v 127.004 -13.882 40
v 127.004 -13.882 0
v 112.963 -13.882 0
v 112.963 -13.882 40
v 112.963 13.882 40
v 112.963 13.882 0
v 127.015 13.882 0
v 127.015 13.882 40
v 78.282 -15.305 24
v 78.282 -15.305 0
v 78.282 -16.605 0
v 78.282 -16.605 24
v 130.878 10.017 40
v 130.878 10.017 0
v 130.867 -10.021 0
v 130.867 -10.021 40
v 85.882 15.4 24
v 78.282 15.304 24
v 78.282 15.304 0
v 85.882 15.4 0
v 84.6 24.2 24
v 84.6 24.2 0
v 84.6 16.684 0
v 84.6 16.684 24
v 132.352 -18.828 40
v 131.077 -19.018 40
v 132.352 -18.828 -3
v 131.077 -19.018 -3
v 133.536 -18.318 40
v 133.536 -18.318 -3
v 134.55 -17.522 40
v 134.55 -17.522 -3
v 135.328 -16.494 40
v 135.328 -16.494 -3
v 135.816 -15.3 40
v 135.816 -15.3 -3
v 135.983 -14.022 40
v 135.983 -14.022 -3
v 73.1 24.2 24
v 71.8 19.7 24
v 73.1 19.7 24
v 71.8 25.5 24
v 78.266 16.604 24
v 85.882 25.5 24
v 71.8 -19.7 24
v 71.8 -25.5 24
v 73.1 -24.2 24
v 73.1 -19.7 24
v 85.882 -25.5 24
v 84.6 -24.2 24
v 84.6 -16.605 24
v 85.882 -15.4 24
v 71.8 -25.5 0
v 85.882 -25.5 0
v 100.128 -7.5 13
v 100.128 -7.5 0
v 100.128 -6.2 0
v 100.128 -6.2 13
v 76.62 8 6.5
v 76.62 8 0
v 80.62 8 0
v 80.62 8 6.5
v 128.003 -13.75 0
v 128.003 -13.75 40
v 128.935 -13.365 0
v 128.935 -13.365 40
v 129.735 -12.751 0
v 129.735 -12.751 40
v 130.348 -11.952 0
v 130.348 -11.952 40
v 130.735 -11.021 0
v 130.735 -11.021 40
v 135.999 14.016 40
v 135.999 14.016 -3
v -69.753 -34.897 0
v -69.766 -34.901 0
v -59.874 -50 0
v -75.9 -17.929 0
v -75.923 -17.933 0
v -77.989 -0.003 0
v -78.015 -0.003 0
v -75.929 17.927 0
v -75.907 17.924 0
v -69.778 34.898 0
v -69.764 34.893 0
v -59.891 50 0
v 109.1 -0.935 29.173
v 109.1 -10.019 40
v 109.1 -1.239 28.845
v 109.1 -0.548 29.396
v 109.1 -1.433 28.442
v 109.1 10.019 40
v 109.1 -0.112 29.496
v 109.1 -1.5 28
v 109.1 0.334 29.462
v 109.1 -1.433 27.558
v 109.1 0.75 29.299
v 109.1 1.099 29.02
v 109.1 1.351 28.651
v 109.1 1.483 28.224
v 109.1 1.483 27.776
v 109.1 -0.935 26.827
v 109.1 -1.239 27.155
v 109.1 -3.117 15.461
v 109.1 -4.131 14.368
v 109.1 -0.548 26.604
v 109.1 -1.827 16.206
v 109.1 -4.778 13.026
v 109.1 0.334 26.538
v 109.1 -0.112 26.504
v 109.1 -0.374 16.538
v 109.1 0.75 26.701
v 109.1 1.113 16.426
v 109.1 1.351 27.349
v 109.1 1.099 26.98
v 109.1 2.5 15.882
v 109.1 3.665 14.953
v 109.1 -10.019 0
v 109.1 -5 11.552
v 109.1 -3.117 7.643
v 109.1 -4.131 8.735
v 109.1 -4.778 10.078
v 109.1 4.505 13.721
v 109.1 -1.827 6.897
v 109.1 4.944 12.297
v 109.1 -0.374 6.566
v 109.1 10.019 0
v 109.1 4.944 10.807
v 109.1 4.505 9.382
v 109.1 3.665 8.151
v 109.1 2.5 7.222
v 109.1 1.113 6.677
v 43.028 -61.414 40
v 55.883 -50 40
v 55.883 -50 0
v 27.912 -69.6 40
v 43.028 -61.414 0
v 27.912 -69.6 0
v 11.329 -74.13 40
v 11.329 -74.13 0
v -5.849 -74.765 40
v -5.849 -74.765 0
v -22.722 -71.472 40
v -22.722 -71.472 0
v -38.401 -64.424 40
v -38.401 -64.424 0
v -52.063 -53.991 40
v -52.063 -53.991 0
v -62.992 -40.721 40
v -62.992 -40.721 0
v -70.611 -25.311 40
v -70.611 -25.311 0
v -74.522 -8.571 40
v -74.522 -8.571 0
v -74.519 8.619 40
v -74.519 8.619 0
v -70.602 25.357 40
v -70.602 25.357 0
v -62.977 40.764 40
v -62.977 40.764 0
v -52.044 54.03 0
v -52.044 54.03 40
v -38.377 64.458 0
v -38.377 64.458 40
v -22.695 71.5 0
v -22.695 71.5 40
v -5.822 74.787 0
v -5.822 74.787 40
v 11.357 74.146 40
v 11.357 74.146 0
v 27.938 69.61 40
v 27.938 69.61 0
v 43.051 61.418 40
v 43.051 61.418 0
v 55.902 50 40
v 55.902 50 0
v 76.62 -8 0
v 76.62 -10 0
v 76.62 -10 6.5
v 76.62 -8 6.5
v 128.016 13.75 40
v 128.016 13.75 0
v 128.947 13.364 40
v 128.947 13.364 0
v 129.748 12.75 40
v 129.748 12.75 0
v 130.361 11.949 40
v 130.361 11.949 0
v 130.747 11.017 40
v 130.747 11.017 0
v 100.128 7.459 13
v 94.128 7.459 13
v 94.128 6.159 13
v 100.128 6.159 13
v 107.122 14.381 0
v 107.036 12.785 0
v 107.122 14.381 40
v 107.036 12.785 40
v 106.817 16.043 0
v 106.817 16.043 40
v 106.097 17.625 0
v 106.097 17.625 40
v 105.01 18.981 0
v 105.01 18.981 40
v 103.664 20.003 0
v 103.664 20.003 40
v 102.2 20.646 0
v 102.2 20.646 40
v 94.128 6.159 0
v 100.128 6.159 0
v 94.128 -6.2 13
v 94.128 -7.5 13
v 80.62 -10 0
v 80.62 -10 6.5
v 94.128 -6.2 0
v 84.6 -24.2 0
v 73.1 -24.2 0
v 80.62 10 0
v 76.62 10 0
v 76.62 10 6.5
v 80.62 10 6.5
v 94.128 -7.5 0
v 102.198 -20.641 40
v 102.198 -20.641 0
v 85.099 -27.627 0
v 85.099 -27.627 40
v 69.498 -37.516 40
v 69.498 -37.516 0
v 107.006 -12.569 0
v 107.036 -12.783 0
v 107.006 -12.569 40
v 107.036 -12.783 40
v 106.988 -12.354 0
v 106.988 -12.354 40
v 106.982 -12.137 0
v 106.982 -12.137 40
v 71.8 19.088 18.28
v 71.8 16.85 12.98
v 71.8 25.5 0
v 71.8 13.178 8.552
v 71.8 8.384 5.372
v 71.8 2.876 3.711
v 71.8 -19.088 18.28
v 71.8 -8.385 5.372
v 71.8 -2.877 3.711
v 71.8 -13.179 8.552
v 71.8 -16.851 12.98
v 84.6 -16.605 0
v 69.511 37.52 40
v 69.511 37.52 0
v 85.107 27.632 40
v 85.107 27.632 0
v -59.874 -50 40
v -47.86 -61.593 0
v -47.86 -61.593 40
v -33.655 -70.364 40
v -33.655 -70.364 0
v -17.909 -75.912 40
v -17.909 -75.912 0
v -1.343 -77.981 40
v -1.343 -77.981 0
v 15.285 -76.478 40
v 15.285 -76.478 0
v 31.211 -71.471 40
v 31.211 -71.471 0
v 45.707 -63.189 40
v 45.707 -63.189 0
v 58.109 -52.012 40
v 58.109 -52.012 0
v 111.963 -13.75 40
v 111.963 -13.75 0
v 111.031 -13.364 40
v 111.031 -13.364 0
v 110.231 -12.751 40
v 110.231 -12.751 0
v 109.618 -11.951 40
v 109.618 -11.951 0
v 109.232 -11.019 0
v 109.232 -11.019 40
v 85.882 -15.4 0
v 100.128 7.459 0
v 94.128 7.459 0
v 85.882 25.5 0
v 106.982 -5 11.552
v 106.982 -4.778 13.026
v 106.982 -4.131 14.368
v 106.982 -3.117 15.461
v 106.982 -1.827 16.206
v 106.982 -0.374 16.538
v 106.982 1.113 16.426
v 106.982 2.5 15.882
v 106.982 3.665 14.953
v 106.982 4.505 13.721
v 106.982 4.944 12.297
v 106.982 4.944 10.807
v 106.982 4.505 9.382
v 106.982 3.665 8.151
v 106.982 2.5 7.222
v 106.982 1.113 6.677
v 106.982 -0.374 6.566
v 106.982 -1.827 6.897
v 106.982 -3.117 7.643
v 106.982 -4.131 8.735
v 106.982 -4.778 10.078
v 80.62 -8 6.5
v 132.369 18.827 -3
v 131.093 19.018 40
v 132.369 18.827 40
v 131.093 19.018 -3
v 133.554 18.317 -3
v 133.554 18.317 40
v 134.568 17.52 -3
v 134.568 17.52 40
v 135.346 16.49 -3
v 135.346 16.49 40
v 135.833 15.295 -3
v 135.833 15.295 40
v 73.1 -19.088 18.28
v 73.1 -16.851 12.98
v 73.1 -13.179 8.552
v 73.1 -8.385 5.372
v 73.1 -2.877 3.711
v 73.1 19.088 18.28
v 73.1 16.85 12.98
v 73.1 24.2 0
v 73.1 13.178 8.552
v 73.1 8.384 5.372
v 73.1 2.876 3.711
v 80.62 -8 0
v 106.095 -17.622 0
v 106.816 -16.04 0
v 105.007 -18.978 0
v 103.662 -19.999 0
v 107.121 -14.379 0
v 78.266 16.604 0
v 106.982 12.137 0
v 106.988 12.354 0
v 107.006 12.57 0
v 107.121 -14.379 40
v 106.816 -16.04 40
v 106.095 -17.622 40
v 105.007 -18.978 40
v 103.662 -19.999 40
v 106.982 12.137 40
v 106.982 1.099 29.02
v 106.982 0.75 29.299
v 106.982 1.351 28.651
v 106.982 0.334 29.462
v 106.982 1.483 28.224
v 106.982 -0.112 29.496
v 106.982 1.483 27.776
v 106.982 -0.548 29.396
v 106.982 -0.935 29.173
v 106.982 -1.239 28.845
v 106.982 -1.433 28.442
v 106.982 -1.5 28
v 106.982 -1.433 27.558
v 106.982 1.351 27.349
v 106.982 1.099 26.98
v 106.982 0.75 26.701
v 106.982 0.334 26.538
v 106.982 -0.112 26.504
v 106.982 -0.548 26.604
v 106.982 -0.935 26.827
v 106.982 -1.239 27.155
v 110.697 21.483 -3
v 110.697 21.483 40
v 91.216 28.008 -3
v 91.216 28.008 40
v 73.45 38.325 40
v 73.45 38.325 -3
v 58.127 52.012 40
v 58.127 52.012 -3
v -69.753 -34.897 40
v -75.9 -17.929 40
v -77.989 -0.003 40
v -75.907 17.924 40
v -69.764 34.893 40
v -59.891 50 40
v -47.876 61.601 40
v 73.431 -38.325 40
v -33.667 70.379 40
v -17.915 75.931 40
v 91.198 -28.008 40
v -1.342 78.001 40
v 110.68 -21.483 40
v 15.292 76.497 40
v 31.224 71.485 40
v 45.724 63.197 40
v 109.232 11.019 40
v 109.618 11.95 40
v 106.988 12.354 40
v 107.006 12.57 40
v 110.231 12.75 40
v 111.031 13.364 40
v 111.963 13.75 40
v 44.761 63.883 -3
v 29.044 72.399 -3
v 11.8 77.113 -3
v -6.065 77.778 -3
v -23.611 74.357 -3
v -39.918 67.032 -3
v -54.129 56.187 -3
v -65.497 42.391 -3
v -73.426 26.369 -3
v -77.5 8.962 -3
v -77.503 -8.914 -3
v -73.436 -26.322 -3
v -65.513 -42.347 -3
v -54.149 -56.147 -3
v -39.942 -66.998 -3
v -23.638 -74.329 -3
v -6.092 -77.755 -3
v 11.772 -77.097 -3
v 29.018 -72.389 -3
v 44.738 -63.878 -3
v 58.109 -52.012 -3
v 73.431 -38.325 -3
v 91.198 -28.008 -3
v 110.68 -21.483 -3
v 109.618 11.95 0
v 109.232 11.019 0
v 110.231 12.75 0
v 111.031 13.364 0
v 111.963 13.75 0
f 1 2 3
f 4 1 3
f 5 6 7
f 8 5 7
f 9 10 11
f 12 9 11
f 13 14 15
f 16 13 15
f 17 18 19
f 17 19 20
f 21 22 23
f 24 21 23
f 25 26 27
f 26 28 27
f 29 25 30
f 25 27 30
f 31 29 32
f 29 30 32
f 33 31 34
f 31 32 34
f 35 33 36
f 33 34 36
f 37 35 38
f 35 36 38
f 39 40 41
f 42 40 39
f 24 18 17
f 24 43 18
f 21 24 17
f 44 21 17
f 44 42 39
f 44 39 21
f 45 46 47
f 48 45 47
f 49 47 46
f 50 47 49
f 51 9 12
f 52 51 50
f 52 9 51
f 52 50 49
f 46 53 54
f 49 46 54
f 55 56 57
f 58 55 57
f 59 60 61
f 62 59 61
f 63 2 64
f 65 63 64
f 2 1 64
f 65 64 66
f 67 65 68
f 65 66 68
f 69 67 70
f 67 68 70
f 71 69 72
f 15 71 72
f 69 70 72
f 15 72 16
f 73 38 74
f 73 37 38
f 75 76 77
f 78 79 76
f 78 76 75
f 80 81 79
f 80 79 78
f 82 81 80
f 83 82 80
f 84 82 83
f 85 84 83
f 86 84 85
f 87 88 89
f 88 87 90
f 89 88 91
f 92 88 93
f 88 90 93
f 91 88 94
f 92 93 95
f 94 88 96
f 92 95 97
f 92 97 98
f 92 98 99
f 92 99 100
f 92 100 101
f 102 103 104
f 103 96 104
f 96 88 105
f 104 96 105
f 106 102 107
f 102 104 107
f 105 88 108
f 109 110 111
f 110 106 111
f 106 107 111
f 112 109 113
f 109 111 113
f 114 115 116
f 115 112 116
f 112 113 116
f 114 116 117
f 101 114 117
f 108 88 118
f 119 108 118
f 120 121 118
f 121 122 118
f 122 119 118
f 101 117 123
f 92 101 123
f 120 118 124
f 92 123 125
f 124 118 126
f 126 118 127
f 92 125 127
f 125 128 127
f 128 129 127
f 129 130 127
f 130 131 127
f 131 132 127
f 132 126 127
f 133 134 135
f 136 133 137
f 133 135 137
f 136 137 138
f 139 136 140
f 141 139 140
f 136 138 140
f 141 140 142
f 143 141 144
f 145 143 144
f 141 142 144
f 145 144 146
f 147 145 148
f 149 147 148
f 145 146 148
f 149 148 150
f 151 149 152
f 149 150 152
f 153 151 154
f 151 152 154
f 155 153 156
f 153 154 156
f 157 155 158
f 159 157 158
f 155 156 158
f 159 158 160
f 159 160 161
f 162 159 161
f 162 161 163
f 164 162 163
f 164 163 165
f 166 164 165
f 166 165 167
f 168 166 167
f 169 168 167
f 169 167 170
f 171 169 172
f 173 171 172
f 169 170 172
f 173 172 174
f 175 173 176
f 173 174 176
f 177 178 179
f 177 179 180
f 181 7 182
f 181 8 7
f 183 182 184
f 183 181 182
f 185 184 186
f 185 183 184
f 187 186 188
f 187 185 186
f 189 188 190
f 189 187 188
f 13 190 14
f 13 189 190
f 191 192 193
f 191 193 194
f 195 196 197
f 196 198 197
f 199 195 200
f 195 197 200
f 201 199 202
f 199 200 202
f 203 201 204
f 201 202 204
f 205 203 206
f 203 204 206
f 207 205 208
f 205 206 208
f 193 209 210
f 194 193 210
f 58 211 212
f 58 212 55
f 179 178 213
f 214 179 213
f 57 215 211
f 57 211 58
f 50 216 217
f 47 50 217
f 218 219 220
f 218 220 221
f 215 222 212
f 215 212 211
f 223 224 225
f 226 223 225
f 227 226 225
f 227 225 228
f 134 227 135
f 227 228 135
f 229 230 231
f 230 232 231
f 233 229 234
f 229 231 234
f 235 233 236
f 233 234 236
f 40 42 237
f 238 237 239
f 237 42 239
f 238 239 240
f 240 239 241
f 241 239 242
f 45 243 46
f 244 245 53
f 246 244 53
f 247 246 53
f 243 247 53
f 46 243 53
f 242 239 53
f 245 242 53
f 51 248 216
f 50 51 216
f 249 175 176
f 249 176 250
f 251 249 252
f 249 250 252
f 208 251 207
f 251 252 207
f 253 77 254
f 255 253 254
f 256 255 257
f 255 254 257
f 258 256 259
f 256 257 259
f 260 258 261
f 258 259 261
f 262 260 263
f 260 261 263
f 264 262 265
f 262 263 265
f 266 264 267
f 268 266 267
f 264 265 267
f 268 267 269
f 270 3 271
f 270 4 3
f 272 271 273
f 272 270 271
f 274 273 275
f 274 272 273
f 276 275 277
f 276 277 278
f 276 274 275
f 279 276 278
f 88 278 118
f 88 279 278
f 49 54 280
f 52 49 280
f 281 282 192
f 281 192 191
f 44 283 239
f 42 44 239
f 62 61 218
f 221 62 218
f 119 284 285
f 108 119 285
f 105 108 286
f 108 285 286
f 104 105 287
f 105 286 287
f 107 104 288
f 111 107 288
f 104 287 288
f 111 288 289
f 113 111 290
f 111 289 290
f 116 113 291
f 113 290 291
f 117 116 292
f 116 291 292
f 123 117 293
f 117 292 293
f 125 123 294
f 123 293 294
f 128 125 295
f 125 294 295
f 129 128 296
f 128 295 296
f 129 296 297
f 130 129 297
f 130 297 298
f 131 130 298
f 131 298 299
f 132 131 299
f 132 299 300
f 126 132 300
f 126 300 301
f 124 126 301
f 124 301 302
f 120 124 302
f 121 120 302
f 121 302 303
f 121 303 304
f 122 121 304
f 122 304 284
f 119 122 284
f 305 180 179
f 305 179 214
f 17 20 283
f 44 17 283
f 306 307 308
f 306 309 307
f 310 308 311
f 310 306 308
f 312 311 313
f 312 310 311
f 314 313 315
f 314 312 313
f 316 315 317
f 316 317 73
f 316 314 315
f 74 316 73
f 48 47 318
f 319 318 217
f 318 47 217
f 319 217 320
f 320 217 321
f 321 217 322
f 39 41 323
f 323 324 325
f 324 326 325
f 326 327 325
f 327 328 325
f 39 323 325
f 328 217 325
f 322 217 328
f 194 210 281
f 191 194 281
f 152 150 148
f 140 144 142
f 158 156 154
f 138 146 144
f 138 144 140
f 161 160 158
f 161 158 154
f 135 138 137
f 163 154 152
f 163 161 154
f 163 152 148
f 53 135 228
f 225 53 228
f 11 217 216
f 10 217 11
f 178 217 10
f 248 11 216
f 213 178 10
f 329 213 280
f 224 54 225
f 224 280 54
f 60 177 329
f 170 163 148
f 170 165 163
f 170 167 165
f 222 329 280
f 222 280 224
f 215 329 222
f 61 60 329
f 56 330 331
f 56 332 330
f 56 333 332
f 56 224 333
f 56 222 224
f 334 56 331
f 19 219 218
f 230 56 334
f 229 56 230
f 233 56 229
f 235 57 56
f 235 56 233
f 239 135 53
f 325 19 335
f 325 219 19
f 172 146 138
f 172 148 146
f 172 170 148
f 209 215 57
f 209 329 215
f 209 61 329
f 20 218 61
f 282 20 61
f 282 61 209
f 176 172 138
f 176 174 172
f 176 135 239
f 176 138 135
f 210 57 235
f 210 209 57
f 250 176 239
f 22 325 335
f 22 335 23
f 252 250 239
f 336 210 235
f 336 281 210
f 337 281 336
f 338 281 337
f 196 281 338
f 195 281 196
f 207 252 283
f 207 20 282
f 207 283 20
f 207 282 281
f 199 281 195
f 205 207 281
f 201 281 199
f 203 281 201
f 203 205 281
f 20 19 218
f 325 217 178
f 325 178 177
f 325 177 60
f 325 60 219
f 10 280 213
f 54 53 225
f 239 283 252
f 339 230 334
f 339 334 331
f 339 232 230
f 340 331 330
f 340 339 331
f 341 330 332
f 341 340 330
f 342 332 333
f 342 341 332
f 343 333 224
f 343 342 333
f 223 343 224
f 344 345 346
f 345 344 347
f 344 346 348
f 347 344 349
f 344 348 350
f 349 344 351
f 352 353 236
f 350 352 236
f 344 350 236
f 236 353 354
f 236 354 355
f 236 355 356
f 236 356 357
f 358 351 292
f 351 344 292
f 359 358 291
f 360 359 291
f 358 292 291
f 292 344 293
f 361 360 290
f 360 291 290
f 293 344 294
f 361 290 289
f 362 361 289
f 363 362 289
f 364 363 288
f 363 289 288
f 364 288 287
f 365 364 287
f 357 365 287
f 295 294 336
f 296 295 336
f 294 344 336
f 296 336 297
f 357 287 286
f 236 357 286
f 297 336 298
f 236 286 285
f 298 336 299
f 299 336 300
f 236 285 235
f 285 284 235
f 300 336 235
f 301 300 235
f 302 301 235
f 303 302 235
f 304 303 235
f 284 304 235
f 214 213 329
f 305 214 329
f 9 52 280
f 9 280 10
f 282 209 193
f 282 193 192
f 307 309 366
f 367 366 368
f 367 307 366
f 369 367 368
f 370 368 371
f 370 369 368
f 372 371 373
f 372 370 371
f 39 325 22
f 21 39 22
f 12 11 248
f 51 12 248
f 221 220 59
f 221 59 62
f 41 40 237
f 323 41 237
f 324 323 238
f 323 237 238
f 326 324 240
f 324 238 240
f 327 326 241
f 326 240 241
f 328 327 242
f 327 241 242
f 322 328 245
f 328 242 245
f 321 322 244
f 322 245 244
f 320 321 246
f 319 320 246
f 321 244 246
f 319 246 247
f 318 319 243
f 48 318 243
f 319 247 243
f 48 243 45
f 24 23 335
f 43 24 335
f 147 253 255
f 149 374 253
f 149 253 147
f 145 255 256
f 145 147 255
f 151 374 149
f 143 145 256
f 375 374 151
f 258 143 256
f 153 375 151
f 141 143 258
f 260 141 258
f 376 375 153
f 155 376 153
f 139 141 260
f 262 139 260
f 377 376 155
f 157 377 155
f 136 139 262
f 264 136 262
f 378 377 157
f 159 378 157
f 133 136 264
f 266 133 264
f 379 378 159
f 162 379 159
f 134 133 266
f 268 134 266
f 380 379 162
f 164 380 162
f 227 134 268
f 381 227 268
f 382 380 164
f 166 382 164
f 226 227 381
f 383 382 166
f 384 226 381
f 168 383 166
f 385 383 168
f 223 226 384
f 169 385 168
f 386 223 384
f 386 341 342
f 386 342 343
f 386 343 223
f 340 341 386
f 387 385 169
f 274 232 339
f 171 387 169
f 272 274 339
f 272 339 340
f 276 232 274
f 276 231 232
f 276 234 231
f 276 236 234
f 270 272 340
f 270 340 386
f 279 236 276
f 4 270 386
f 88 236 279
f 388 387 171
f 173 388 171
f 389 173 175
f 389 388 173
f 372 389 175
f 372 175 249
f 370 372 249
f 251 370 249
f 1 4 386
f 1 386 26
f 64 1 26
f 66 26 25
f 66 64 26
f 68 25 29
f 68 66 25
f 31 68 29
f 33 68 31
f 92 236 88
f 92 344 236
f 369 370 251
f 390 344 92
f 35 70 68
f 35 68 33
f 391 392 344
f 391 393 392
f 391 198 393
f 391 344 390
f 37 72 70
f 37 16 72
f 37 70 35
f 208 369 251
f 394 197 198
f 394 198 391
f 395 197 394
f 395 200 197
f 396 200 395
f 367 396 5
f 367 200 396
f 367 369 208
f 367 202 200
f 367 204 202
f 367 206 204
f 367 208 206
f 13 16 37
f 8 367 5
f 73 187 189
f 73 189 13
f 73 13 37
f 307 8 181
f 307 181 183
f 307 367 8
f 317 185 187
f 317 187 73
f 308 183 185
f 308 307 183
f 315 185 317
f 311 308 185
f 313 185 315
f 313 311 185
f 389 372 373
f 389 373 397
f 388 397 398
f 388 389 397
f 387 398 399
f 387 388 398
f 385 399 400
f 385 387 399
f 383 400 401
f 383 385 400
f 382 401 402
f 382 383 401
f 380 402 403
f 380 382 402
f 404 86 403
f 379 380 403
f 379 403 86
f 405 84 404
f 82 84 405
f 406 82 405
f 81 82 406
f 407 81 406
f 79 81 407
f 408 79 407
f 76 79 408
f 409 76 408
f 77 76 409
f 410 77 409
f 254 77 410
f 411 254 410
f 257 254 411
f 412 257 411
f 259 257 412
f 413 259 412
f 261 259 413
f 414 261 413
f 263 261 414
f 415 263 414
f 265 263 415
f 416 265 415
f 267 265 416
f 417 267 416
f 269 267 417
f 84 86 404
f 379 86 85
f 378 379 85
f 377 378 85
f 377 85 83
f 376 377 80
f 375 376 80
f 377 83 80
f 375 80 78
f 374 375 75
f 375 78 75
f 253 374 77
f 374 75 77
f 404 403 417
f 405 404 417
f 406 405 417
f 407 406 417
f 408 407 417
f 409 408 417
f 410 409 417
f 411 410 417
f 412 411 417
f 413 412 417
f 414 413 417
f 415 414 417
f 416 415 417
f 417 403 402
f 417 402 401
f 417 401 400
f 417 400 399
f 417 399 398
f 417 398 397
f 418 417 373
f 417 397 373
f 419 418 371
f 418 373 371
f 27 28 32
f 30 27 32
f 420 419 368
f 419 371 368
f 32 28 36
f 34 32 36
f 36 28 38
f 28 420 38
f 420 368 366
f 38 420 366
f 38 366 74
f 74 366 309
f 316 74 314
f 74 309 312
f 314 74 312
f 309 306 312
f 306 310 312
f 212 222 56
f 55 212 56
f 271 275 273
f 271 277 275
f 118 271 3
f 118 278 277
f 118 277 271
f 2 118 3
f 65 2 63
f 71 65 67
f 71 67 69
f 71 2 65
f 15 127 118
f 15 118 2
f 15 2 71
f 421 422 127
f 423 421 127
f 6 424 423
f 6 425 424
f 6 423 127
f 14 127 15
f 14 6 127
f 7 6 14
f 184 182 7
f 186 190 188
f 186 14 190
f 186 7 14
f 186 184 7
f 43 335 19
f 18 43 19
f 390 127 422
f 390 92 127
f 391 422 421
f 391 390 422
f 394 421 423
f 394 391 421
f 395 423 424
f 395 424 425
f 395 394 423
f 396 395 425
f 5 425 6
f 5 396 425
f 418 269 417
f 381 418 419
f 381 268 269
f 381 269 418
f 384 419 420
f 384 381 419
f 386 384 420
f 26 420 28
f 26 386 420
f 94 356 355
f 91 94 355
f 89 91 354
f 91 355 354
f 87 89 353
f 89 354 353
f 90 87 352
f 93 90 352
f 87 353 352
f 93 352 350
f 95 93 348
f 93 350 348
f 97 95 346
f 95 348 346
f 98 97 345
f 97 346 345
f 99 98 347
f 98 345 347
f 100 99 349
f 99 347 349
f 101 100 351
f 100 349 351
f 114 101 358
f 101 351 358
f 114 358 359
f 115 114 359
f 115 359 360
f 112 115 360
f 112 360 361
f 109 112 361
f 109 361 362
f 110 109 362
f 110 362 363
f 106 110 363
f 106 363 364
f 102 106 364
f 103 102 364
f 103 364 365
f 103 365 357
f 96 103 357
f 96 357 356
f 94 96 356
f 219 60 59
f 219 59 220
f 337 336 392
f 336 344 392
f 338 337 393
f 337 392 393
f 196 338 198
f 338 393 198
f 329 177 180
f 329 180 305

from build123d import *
from build123d import SkipClean  # not in build123d's __all__

# Parameters (mm, degrees)
F1_DEPTH  = 40
F2_DEPTH  = 3
F3_DEPTH  = 24
F4_DEPTH  = 40
F6_DEPTH  = 2.5
F7_W      = 6
F7_H      = 1.3
F8_DEPTH  = 13
F9_W      = 4
F9_H      = 2
F10_DEPTH = 6.5
F11_R     = 1.5
F12_DEPTH = 3.5
F13_R     = 5
F14_DEPTH = 2.5
F15_R     = 3.8627416998
F16_R     = 7
F17_R     = 7
F18_R     = 5


# Not quite as in the source:
# - after a boolean that leaves OpenCascade's solid faulty, fix() repairs it


with BuildPart() as f1:
    # F0 (on Top) → F1 (new body)
    with BuildSketch(Plane.XY):
        with BuildLine():
            ThreePointArc((136.0017471959, 19.0444356012), (93.4644134414, 27.0237675476), (58.1274125485, 52.0115819608))
            ThreePointArc((58.1274125485, 52.0115819608), (-1.3417961939, 78.0013424722), (-59.8907435455, 49.9999995776))
            ThreePointArc((-59.8907435455, 49.9999995776), (-77.9889397002, -0.003066533), (-59.8738076097, -49.9999995776))
            ThreePointArc((-59.8738076097, -49.9999995776), (-1.3426138919, -77.9810495035), (58.1087045089, -52.0122117666))
            ThreePointArc((58.1087045089, -52.0122117666), (93.4442134492, -27.0247840784), (135.9799137778, -19.0445627716))
            Line((135.9799137778, -19.0445627716), (136.0017471959, 19.0444356012))
        make_face()
        with BuildLine():
            ThreePointArc((55.9016994375, 50), (90.8688121766, 24.8773821457), (133, 16))
            Line((133, 16), (132.9816567922, -16.0002304621))
            ThreePointArc((132.9816567922, -16.0002304621), (90.8504689689, -24.8776126078), (55.8833562297, -50.0002304621))
            ThreePointArc((55.8833562297, -50.0002304621), (-75.0149890076, 0.0238973514), (55.9016994375, 50))
        make_face(mode=Mode.SUBTRACT)
    extrude(amount=F1_DEPTH)

    # F0 (on Top) → F2 (join)
    with BuildSketch(Plane.XY):
        with BuildLine():
            ThreePointArc((136.0017471959, 19.0444356012), (93.4644134414, 27.0237675476), (58.1274125485, 52.0115819608))
            ThreePointArc((58.1274125485, 52.0115819608), (-1.3417961939, 78.0013424722), (-59.8907435455, 49.9999995776))
            ThreePointArc((-59.8907435455, 49.9999995776), (-77.9889397002, -0.003066533), (-59.8738076097, -49.9999995776))
            ThreePointArc((-59.8738076097, -49.9999995776), (-1.3426138919, -77.9810495035), (58.1087045089, -52.0122117666))
            ThreePointArc((58.1087045089, -52.0122117666), (93.4442134492, -27.0247840784), (135.9799137778, -19.0445627716))
            Line((135.9799137778, -19.0445627716), (136.0017471959, 19.0444356012))
        make_face()
        with BuildLine():
            ThreePointArc((55.9016994375, 50), (90.8688121766, 24.8773821457), (133, 16))
            Line((133, 16), (132.9816567922, -16.0002304621))
            ThreePointArc((132.9816567922, -16.0002304621), (90.8504689689, -24.8776126078), (55.8833562297, -50.0002304621))
            ThreePointArc((55.8833562297, -50.0002304621), (-75.0149890076, 0.0238973514), (55.9016994375, 50))
        make_face(mode=Mode.SUBTRACT)
        with BuildLine():
            ThreePointArc((-59.8738076097, -49.9999995776), (-77.9889397002, -0.003066533), (-59.8907435455, 49.9999995776))
            ThreePointArc((-59.8907435455, 49.9999995776), (-78.014990719, -0.003070945), (-59.8738076097, -49.9999995776))
        make_face()
        with BuildLine():
            Line((106.9816567922, 16), (133, 16))
            ThreePointArc((133, 16), (90.8688121766, 24.8773821457), (55.9016994375, 50))
            ThreePointArc((55.9016994375, 50), (-75.0149890076, 0.0238973514), (55.8833562297, -50.0002304621))
            ThreePointArc((55.8833562297, -50.0002304621), (90.8504689689, -24.8776126078), (132.9816567922, -16.0002304621))
            Line((132.9816567922, -16.0002304621), (106.9816567922, -16.0002304621))
            Line((106.9816567922, -16.0002304621), (106.9816567922, 16))
        make_face()
        Polygon((71.8, 25.4997695379), (85.881656831, 25.4997695379), (85.881656831, 15.3997695379), (78.2822565953, 15.3042914831), (78.2659248228, 16.6041888918), (84.6000000387, 16.6837695379), (84.6000000387, 24.1997695379), (73.1, 24.1997695379), (73.1, -24.2002304621), (84.6000000387, -24.2002304621), (84.6000000387, -16.6047524073), (78.2822565953, -16.6047524073), (78.2822565953, -15.3047524073), (85.881656831, -15.4002304621), (85.881656831, -25.5002304621), (71.8, -25.5002304621), align=None, mode=Mode.SUBTRACT)
        Polygon((132.9816567922, -16.0002304621), (133, 16), (106.9816567922, 16), (106.9816567922, -16.0002304621), align=None)
        Polygon((109.1000003293, -13.881886925), (109.1000003293, 13.8816564629), (130.8804418356, 13.8816564629), (130.8645271863, -13.881886925), align=None, mode=Mode.SUBTRACT)
        Polygon((130.8804418356, 13.8816564629), (109.1000003293, 13.8816564629), (109.1000003293, -13.881886925), (130.8645271863, -13.881886925), align=None)
        Polygon((85.881656831, 15.3997695379), (85.881656831, 25.4997695379), (71.8, 25.4997695379), (71.8, -25.5002304621), (85.881656831, -25.5002304621), (85.881656831, -15.4002304621), (78.2822565953, -15.3047524073), (78.2822565953, -16.6047524073), (84.6000000387, -16.6047524073), (84.6000000387, -24.2002304621), (73.1, -24.2002304621), (73.1, 24.1997695379), (84.6000000387, 24.1997695379), (84.6000000387, 16.6837695379), (78.2659248228, 16.6041888918), (78.2822565953, 15.3042914831), align=None)
    with SkipClean():  # cleaning this boolean's faces spoils the solid; the shape is the same uncleaned
        extrude(amount=-F2_DEPTH)

    # F0 (on Top) → F3 (join)
    with BuildSketch(Plane.XY):
        Polygon((85.881656831, 15.3997695379), (85.881656831, 25.4997695379), (71.8, 25.4997695379), (71.8, -25.5002304621), (85.881656831, -25.5002304621), (85.881656831, -15.4002304621), (78.2822565953, -15.3047524073), (78.2822565953, -16.6047524073), (84.6000000387, -16.6047524073), (84.6000000387, -24.2002304621), (73.1, -24.2002304621), (73.1, 24.1997695379), (84.6000000387, 24.1997695379), (84.6000000387, 16.6837695379), (78.2659248228, 16.6041888918), (78.2822565953, 15.3042914831), align=None)
    extrude(amount=F3_DEPTH)

    add(f1.part.fix(), mode=Mode.REPLACE)

    # F0 (on Top) → F4 (join)
    with BuildSketch(Plane.XY):
        Polygon((132.9816567922, -16.0002304621), (133, 16), (106.9816567922, 16), (106.9816567922, -16.0002304621), align=None)
        Polygon((109.1000003293, -13.881886925), (109.1000003293, 13.8816564629), (130.8804418356, 13.8816564629), (130.8645271863, -13.881886925), align=None, mode=Mode.SUBTRACT)
    extrude(amount=F4_DEPTH)

    # F5 (on face) → F6 (cut)
    with BuildSketch(Plane(origin=(71.8, 0, 0), x_dir=(0, -1, 0), z_dir=(-1, 0, 0))):
        with BuildLine():
            Line((19.7002304621, 24), (-19.6997695379, 24))
            ThreePointArc((-19.6997695379, 24), (0.0002304621, 3.4999999987), (19.7002304621, 24))
        make_face()
    extrude(amount=-F6_DEPTH, mode=Mode.SUBTRACT)

    # F7 (on face) → F8 (join)
    with BuildSketch(Plane.XY):
        with Locations((97.1279456019, 6.8092534184)):
            Rectangle(F7_W, F7_H)
        with Locations((97.1279456019, -6.85)):
            Rectangle(F7_W, F7_H)
    extrude(amount=F8_DEPTH)

    # F9 (on face) → F10 (join)
    with BuildSketch(Plane.XY):
        with Locations((78.6196921468, 9)):
            Rectangle(F9_W, F9_H)
        with Locations((78.6196921468, -9)):
            Rectangle(F9_W, F9_H)
    extrude(amount=F10_DEPTH)

    # F11 (on face) → F12 (cut)
    with BuildSketch(Plane(origin=(106.9816567922, 0, 0), x_dir=(0, -1, 0), z_dir=(-1, 0, 0))):
        with Locations((0.0001152311, 28)):
            Circle(F11_R)
    extrude(amount=-F12_DEPTH, mode=Mode.SUBTRACT)

    # F13 (on face) → F14 (cut)
    with BuildSketch(Plane(origin=(106.9816567922, 0, 0), x_dir=(0, -1, 0), z_dir=(-1, 0, 0))):
        with Locations((0, 11.5517321974)):
            Circle(F13_R)
    extrude(amount=-F14_DEPTH, mode=Mode.SUBTRACT)

    # F15
    f15_edges = [f1.edges().sort_by_distance(p)[0] for p in [
        (130.880442, 13.881656, 20),
        (106.981657, 16, 20),
        (109.1, 13.881656, 20),
        (130.864527, -13.881887, 20),
        (106.981657, -16.00023, 20),
        (109.1, -13.881887, 20),
    ]]
    fillet(f15_edges, radius=F15_R)

    # F16
    f16_edges = [f1.edges().sort_by_distance(p)[0] for p in [
        (132.981657, -16.00023, 20),
    ]]
    fillet(f16_edges, radius=F16_R)

    # F17
    f17_edges = [f1.edges().sort_by_distance(p)[0] for p in [
        (133, 16, 20),
    ]]
    fillet(f17_edges, radius=F17_R)

    # F18
    f18_edges = [f1.edges().sort_by_distance(p)[0] for p in [
        (135.979914, -19.044563, 18.5),
        (136.001747, 19.044436, 18.5),
    ]]
    fillet(f18_edges, radius=F18_R)


solid = f1.part
